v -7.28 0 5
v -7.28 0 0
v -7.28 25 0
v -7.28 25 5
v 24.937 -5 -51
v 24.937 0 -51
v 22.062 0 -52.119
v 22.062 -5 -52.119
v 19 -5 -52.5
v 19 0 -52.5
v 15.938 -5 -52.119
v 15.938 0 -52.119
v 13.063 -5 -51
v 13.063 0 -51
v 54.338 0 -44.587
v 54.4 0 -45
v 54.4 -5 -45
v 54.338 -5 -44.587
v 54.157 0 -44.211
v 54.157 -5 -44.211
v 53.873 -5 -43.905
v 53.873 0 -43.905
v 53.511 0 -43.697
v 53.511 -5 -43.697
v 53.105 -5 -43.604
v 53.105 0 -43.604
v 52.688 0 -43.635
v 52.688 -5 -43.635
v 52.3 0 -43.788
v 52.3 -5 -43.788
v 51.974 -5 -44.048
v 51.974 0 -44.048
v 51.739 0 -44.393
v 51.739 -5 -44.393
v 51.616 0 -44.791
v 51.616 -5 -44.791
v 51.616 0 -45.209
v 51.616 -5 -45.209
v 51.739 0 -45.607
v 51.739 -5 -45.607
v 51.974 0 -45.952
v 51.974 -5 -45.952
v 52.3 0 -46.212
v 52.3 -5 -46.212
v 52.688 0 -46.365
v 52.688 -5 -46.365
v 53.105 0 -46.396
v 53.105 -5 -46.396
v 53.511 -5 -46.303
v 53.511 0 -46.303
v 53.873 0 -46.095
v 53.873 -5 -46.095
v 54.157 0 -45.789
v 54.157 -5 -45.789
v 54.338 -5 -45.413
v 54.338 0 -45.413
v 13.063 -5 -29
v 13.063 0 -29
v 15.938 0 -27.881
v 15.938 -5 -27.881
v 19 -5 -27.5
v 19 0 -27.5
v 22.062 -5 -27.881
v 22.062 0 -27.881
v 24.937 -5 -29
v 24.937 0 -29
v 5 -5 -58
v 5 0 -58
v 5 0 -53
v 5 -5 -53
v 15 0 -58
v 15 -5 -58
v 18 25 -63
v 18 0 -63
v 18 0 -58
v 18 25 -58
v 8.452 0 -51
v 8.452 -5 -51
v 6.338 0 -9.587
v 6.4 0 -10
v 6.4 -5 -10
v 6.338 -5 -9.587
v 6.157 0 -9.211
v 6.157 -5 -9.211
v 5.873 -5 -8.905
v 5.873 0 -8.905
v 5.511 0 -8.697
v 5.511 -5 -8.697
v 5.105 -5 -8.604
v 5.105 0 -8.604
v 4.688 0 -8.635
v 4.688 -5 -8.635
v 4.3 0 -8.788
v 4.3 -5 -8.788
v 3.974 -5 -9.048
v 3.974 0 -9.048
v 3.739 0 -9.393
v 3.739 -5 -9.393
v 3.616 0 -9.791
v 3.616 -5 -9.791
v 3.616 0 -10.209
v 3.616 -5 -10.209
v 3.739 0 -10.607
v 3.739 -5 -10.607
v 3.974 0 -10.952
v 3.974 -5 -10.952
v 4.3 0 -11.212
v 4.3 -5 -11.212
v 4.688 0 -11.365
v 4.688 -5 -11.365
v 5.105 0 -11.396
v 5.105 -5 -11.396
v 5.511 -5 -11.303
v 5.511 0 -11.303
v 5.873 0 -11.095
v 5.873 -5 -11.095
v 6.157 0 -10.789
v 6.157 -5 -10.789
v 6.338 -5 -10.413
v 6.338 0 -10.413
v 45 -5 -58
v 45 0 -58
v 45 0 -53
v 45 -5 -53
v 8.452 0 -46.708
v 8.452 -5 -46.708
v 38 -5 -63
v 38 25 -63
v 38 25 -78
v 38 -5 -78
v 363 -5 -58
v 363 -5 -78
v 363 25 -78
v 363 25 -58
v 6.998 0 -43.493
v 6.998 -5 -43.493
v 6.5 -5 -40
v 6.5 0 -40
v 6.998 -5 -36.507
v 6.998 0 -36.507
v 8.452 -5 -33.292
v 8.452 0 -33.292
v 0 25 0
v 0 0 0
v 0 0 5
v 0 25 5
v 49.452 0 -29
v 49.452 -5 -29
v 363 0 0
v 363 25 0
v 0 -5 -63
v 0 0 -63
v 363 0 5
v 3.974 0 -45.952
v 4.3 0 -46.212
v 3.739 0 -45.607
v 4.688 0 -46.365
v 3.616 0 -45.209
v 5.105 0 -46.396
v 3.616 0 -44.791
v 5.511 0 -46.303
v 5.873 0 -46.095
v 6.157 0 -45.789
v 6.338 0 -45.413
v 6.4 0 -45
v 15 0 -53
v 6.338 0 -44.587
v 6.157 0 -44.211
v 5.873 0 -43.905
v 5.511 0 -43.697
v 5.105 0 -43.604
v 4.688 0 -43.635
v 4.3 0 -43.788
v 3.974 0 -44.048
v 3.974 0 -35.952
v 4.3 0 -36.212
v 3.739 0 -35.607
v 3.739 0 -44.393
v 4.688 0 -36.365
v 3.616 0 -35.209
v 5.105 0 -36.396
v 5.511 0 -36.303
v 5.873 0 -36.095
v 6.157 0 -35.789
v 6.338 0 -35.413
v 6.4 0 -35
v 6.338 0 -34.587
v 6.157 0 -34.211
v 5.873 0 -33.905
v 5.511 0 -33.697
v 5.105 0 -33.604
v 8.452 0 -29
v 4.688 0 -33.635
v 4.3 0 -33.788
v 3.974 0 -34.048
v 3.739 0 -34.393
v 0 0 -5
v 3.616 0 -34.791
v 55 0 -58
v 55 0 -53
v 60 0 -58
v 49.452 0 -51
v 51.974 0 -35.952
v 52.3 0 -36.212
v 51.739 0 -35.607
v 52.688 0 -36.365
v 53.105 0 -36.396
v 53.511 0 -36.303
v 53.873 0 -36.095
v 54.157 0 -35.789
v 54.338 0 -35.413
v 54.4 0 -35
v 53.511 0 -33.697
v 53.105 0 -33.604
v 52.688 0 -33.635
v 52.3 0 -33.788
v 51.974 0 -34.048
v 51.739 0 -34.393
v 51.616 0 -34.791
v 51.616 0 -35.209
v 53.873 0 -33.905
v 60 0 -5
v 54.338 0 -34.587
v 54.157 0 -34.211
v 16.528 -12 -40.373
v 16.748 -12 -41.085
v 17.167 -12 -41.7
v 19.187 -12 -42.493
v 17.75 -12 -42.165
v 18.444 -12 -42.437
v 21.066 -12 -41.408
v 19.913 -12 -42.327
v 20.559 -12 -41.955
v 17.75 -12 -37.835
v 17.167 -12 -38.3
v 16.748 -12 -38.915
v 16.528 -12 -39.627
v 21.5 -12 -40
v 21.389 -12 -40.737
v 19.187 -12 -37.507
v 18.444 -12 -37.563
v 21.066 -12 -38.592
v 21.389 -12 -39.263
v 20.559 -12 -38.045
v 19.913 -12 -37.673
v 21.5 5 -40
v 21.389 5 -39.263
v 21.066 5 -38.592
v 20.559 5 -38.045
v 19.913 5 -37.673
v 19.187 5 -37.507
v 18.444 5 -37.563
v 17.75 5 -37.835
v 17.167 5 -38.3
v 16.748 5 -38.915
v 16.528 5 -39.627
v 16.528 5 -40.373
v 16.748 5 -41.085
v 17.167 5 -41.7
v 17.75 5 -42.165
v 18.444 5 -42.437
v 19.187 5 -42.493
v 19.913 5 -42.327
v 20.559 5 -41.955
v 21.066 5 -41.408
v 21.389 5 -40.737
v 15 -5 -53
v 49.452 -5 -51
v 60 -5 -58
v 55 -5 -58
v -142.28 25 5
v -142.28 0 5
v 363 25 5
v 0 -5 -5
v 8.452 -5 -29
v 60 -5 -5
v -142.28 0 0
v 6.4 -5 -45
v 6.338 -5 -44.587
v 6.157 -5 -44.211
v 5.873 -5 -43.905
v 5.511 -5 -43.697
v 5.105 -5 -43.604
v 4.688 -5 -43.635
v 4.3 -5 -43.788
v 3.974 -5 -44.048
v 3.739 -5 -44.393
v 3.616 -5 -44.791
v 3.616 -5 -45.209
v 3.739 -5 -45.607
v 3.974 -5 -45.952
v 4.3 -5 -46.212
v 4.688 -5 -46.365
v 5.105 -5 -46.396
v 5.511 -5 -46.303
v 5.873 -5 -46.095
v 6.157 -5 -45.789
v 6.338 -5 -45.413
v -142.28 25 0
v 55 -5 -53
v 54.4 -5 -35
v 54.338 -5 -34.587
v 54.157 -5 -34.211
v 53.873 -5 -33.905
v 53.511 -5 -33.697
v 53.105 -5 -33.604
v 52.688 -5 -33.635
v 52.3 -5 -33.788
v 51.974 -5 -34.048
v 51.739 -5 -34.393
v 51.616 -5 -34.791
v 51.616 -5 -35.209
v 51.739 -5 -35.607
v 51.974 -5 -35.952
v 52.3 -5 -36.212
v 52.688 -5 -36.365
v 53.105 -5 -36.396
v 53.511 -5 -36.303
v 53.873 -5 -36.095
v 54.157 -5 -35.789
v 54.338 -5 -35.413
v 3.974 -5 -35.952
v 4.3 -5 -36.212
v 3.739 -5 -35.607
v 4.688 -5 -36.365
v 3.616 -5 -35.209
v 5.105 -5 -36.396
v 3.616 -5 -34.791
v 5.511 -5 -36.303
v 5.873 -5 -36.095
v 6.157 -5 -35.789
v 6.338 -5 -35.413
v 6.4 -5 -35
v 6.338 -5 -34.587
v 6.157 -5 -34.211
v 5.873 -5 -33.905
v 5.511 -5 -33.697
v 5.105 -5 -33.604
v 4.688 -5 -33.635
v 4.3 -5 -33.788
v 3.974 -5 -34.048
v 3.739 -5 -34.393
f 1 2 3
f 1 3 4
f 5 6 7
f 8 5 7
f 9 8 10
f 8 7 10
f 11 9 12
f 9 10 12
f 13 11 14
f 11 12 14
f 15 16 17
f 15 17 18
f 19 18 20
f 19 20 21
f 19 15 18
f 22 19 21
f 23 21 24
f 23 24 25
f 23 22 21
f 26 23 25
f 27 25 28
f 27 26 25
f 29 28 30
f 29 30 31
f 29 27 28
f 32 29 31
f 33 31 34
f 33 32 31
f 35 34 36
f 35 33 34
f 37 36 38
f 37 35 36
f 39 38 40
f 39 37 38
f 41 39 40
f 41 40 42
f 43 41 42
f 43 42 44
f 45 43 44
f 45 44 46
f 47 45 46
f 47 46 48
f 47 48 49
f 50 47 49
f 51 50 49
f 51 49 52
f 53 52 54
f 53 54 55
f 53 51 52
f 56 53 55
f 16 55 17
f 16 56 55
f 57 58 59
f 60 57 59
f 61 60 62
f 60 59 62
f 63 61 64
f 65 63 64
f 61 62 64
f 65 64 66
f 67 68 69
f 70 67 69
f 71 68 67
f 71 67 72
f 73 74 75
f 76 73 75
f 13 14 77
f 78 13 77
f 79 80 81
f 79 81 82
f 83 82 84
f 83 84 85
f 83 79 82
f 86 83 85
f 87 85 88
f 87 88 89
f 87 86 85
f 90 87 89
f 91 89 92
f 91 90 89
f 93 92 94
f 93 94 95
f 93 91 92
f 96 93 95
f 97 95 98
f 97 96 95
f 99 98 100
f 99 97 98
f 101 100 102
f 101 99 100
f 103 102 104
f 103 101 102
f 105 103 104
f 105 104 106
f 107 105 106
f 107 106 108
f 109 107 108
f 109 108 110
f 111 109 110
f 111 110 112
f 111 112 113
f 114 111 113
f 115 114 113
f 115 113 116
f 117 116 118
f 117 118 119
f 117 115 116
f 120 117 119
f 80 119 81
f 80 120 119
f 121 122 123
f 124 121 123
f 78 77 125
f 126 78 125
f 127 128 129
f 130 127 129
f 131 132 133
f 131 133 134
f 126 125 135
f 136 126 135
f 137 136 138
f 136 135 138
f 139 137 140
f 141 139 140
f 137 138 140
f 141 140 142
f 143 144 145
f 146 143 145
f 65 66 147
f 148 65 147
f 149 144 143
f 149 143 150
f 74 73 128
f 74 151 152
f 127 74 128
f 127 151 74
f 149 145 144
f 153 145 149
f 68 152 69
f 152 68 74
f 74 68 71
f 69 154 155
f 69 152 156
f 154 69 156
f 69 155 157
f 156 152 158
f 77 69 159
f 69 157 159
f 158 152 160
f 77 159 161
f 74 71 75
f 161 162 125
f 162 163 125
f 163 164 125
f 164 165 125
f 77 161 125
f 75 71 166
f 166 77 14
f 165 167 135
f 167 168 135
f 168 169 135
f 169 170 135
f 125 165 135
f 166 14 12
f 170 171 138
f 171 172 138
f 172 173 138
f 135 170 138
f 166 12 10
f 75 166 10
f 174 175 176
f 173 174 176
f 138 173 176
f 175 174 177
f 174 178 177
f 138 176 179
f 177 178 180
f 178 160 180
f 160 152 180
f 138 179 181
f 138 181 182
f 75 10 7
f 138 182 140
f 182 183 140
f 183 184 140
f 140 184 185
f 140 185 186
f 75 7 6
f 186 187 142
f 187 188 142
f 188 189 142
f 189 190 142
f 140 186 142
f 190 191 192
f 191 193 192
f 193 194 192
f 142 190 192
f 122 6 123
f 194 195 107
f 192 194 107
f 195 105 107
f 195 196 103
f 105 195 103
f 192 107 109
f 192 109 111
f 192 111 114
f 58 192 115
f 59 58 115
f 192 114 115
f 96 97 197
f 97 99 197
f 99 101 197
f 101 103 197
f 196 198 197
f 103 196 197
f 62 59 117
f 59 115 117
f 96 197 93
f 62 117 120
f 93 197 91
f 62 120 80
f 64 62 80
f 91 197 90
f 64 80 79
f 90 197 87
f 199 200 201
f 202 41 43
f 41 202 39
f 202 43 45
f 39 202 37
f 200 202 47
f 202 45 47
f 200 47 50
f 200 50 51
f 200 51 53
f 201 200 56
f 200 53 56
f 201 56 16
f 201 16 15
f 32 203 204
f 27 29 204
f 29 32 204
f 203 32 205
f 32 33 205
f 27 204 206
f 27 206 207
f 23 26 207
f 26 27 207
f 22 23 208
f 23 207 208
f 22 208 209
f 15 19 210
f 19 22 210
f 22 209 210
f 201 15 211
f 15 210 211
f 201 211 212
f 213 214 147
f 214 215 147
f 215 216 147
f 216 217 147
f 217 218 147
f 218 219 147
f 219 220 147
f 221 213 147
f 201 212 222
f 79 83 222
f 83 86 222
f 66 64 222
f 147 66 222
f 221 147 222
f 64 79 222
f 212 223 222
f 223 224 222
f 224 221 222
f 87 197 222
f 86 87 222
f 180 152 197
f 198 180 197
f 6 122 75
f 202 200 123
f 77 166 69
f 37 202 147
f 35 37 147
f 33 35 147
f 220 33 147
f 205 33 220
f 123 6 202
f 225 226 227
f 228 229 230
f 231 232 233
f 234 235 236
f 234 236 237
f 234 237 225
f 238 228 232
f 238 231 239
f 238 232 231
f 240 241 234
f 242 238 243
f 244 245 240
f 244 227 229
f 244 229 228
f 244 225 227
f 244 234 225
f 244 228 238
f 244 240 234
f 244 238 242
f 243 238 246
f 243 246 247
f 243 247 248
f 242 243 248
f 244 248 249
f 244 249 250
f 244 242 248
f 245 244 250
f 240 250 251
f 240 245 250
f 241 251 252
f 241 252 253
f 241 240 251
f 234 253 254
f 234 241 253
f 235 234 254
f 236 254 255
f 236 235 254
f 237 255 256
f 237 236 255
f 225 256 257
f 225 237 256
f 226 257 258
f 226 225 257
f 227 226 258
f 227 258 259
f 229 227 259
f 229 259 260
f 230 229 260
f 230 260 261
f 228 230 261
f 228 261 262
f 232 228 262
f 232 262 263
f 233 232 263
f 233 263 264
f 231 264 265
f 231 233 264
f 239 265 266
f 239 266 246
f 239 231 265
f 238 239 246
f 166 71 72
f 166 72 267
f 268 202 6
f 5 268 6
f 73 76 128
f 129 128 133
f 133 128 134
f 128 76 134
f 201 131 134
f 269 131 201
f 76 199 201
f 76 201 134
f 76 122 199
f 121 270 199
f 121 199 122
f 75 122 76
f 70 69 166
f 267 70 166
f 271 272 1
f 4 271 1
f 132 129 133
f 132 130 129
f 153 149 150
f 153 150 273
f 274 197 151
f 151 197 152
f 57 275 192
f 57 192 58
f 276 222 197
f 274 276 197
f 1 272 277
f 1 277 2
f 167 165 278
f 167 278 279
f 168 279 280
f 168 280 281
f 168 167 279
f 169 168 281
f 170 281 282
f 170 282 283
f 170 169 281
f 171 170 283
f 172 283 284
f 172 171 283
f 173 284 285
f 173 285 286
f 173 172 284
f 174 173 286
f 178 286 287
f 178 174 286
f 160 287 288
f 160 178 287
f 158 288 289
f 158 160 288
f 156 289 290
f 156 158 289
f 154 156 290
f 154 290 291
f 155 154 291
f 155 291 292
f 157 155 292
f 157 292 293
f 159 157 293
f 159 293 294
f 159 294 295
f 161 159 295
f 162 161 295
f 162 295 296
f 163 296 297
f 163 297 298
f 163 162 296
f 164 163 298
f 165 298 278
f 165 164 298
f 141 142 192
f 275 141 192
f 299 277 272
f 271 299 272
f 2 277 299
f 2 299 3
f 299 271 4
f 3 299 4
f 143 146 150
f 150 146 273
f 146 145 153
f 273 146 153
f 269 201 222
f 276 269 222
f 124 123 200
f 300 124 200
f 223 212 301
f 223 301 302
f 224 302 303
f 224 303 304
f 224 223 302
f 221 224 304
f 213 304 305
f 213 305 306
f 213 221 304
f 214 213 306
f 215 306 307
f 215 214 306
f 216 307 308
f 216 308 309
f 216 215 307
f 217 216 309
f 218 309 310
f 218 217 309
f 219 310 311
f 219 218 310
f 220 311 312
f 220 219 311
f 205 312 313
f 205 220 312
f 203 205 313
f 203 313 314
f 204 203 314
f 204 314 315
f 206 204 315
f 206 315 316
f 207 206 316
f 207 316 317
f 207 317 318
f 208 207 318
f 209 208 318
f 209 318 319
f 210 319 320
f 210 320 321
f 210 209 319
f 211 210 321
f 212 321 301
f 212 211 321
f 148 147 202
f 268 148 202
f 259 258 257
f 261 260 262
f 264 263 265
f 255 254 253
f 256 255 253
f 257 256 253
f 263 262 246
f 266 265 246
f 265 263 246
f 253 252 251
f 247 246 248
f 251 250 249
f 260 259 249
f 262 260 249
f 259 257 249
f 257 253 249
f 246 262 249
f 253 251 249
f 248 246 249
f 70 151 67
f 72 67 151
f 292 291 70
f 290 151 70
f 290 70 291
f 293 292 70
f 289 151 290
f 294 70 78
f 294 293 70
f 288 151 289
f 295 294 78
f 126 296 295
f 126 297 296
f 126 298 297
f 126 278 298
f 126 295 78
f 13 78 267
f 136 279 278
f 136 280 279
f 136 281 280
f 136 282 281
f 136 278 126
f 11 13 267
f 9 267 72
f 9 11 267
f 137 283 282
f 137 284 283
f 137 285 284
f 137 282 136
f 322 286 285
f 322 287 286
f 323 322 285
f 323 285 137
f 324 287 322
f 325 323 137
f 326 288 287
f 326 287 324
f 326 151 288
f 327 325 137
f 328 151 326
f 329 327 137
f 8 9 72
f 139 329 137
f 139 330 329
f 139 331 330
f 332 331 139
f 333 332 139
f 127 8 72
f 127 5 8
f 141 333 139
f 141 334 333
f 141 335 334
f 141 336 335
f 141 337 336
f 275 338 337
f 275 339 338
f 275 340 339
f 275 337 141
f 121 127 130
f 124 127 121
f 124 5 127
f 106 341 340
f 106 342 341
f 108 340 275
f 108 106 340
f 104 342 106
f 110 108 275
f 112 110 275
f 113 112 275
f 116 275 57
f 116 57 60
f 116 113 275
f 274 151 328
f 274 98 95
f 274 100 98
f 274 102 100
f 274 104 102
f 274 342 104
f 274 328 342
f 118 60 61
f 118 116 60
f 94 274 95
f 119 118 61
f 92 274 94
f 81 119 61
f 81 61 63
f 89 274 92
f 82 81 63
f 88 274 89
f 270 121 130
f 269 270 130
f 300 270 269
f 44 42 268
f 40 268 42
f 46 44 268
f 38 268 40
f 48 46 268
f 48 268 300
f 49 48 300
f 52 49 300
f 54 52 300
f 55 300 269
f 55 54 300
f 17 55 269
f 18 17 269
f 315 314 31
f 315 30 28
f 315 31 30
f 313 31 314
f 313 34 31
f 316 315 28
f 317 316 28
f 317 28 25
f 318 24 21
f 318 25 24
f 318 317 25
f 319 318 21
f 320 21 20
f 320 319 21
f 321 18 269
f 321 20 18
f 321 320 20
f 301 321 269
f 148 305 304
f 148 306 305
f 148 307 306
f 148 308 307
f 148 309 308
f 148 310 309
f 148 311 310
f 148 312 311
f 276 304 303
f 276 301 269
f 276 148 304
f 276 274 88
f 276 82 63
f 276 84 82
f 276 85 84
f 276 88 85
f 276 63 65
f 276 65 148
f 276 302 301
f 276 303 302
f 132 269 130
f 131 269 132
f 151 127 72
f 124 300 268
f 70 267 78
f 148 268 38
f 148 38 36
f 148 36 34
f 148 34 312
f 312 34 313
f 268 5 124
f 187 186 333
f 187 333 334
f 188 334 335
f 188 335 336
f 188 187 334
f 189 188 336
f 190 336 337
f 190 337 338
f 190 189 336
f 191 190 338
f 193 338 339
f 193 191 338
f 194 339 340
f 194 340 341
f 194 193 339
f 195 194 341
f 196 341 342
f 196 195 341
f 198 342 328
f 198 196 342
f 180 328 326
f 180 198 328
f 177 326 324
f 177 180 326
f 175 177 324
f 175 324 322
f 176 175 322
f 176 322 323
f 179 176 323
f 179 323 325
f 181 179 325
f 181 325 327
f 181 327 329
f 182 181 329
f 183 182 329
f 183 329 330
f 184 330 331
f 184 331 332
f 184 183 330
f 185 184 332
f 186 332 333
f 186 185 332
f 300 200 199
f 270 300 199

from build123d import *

# Parameters (mm, degrees)
F0_W     = 10
F0_H     = 5
F0_R     = 1.4
F0_W_2   = 20
F1_DEPTH = 5
F0_W_3   = 135
F2_DEPTH = 25
F0_W_4   = 363
F4_R     = 2.5
F5_DEPTH = 17


with BuildPart() as f1:
    # F0 (on Front) → F1 (new body)
    with BuildSketch(Plane.XZ):
        Polygon((55, -58), (60, -58), (60, -5), (0, -5), (0, -63), (18, -63), (18, -58), (38, -58), (45, -58), (45, -53), (55, -53), align=None)
        with Locations((10, -55.5)):
            Rectangle(F0_W, F0_H, mode=Mode.SUBTRACT)
        with Locations((5, -45)):
            Circle(F0_R, mode=Mode.SUBTRACT)
        with BuildLine():
            Line((8.4524883067, -33.2917962852), (8.4524883067, -29))
            Line((8.4524883067, -29), (13.0628289565, -29))
            ThreePointArc((13.0628289565, -29), (19, -27.5), (24.9371710435, -29))
            Line((24.9371710435, -29), (49.4524883067, -29))
            Line((49.4524883067, -29), (49.4524883067, -51))
            Line((49.4524883067, -51), (24.9371710435, -51))
            ThreePointArc((24.9371710435, -51), (19, -52.5), (13.0628289565, -51))
            Line((13.0628289565, -51), (8.4524883067, -51))
            Line((8.4524883067, -51), (8.4524883067, -46.7082037148))
            ThreePointArc((8.4524883067, -46.7082037148), (6.5, -40), (8.4524883067, -33.2917962852))
        make_face(mode=Mode.SUBTRACT)
        with Locations((53, -45)):
            Circle(F0_R, mode=Mode.SUBTRACT)
        with Locations((5, -35)):
            Circle(F0_R, mode=Mode.SUBTRACT)
        with Locations((53, -35)):
            Circle(F0_R, mode=Mode.SUBTRACT)
        with Locations((5, -10)):
            Circle(F0_R, mode=Mode.SUBTRACT)
        with Locations((28, -60.5)):
            Rectangle(F0_W_2, F0_H)
        Polygon((38, -58), (38, -63), (60, -63), (60, -58), (55, -58), (45, -58), align=None)
        Polygon((38, -78), (363, -78), (363, -58), (60, -58), (60, -63), (38, -63), align=None)
    extrude(amount=F1_DEPTH)

    # F0 (on Front) → F2, piece 3 (join)
    with BuildSketch(Plane.XZ):
        Polygon((38, -78), (363, -78), (363, -58), (60, -58), (60, -63), (38, -63), align=None)
        Polygon((38, -58), (38, -63), (60, -63), (60, -58), (55, -58), (45, -58), align=None)
        with Locations((28, -60.5)):
            Rectangle(F0_W_2, F0_H)
    extrude(amount=-F2_DEPTH)


with BuildPart() as f2:
    # F0 (on Front) → F2 (new body)
    with BuildSketch(Plane.XZ):
        with Locations((-74.78, 2.5)):
            Rectangle(F0_W_3, F0_H)
    extrude(amount=-F2_DEPTH)


with BuildPart() as f2b:
    # F0 (on Front) → F2, piece 2 (new body)
    with BuildSketch(Plane.XZ):
        with Locations((181.5, 2.5)):
            Rectangle(F0_W_4, F0_H)
    extrude(amount=-F2_DEPTH)


with BuildPart() as f5:
    # F4 (on offset) → F5 (new body)
    with BuildSketch(Plane.XZ.offset(12)):
        with Locations((19, -40)):
            Circle(F4_R)
    extrude(amount=-F5_DEPTH)


solid = Compound([f1.part, f2.part, f2b.part, f5.part])
